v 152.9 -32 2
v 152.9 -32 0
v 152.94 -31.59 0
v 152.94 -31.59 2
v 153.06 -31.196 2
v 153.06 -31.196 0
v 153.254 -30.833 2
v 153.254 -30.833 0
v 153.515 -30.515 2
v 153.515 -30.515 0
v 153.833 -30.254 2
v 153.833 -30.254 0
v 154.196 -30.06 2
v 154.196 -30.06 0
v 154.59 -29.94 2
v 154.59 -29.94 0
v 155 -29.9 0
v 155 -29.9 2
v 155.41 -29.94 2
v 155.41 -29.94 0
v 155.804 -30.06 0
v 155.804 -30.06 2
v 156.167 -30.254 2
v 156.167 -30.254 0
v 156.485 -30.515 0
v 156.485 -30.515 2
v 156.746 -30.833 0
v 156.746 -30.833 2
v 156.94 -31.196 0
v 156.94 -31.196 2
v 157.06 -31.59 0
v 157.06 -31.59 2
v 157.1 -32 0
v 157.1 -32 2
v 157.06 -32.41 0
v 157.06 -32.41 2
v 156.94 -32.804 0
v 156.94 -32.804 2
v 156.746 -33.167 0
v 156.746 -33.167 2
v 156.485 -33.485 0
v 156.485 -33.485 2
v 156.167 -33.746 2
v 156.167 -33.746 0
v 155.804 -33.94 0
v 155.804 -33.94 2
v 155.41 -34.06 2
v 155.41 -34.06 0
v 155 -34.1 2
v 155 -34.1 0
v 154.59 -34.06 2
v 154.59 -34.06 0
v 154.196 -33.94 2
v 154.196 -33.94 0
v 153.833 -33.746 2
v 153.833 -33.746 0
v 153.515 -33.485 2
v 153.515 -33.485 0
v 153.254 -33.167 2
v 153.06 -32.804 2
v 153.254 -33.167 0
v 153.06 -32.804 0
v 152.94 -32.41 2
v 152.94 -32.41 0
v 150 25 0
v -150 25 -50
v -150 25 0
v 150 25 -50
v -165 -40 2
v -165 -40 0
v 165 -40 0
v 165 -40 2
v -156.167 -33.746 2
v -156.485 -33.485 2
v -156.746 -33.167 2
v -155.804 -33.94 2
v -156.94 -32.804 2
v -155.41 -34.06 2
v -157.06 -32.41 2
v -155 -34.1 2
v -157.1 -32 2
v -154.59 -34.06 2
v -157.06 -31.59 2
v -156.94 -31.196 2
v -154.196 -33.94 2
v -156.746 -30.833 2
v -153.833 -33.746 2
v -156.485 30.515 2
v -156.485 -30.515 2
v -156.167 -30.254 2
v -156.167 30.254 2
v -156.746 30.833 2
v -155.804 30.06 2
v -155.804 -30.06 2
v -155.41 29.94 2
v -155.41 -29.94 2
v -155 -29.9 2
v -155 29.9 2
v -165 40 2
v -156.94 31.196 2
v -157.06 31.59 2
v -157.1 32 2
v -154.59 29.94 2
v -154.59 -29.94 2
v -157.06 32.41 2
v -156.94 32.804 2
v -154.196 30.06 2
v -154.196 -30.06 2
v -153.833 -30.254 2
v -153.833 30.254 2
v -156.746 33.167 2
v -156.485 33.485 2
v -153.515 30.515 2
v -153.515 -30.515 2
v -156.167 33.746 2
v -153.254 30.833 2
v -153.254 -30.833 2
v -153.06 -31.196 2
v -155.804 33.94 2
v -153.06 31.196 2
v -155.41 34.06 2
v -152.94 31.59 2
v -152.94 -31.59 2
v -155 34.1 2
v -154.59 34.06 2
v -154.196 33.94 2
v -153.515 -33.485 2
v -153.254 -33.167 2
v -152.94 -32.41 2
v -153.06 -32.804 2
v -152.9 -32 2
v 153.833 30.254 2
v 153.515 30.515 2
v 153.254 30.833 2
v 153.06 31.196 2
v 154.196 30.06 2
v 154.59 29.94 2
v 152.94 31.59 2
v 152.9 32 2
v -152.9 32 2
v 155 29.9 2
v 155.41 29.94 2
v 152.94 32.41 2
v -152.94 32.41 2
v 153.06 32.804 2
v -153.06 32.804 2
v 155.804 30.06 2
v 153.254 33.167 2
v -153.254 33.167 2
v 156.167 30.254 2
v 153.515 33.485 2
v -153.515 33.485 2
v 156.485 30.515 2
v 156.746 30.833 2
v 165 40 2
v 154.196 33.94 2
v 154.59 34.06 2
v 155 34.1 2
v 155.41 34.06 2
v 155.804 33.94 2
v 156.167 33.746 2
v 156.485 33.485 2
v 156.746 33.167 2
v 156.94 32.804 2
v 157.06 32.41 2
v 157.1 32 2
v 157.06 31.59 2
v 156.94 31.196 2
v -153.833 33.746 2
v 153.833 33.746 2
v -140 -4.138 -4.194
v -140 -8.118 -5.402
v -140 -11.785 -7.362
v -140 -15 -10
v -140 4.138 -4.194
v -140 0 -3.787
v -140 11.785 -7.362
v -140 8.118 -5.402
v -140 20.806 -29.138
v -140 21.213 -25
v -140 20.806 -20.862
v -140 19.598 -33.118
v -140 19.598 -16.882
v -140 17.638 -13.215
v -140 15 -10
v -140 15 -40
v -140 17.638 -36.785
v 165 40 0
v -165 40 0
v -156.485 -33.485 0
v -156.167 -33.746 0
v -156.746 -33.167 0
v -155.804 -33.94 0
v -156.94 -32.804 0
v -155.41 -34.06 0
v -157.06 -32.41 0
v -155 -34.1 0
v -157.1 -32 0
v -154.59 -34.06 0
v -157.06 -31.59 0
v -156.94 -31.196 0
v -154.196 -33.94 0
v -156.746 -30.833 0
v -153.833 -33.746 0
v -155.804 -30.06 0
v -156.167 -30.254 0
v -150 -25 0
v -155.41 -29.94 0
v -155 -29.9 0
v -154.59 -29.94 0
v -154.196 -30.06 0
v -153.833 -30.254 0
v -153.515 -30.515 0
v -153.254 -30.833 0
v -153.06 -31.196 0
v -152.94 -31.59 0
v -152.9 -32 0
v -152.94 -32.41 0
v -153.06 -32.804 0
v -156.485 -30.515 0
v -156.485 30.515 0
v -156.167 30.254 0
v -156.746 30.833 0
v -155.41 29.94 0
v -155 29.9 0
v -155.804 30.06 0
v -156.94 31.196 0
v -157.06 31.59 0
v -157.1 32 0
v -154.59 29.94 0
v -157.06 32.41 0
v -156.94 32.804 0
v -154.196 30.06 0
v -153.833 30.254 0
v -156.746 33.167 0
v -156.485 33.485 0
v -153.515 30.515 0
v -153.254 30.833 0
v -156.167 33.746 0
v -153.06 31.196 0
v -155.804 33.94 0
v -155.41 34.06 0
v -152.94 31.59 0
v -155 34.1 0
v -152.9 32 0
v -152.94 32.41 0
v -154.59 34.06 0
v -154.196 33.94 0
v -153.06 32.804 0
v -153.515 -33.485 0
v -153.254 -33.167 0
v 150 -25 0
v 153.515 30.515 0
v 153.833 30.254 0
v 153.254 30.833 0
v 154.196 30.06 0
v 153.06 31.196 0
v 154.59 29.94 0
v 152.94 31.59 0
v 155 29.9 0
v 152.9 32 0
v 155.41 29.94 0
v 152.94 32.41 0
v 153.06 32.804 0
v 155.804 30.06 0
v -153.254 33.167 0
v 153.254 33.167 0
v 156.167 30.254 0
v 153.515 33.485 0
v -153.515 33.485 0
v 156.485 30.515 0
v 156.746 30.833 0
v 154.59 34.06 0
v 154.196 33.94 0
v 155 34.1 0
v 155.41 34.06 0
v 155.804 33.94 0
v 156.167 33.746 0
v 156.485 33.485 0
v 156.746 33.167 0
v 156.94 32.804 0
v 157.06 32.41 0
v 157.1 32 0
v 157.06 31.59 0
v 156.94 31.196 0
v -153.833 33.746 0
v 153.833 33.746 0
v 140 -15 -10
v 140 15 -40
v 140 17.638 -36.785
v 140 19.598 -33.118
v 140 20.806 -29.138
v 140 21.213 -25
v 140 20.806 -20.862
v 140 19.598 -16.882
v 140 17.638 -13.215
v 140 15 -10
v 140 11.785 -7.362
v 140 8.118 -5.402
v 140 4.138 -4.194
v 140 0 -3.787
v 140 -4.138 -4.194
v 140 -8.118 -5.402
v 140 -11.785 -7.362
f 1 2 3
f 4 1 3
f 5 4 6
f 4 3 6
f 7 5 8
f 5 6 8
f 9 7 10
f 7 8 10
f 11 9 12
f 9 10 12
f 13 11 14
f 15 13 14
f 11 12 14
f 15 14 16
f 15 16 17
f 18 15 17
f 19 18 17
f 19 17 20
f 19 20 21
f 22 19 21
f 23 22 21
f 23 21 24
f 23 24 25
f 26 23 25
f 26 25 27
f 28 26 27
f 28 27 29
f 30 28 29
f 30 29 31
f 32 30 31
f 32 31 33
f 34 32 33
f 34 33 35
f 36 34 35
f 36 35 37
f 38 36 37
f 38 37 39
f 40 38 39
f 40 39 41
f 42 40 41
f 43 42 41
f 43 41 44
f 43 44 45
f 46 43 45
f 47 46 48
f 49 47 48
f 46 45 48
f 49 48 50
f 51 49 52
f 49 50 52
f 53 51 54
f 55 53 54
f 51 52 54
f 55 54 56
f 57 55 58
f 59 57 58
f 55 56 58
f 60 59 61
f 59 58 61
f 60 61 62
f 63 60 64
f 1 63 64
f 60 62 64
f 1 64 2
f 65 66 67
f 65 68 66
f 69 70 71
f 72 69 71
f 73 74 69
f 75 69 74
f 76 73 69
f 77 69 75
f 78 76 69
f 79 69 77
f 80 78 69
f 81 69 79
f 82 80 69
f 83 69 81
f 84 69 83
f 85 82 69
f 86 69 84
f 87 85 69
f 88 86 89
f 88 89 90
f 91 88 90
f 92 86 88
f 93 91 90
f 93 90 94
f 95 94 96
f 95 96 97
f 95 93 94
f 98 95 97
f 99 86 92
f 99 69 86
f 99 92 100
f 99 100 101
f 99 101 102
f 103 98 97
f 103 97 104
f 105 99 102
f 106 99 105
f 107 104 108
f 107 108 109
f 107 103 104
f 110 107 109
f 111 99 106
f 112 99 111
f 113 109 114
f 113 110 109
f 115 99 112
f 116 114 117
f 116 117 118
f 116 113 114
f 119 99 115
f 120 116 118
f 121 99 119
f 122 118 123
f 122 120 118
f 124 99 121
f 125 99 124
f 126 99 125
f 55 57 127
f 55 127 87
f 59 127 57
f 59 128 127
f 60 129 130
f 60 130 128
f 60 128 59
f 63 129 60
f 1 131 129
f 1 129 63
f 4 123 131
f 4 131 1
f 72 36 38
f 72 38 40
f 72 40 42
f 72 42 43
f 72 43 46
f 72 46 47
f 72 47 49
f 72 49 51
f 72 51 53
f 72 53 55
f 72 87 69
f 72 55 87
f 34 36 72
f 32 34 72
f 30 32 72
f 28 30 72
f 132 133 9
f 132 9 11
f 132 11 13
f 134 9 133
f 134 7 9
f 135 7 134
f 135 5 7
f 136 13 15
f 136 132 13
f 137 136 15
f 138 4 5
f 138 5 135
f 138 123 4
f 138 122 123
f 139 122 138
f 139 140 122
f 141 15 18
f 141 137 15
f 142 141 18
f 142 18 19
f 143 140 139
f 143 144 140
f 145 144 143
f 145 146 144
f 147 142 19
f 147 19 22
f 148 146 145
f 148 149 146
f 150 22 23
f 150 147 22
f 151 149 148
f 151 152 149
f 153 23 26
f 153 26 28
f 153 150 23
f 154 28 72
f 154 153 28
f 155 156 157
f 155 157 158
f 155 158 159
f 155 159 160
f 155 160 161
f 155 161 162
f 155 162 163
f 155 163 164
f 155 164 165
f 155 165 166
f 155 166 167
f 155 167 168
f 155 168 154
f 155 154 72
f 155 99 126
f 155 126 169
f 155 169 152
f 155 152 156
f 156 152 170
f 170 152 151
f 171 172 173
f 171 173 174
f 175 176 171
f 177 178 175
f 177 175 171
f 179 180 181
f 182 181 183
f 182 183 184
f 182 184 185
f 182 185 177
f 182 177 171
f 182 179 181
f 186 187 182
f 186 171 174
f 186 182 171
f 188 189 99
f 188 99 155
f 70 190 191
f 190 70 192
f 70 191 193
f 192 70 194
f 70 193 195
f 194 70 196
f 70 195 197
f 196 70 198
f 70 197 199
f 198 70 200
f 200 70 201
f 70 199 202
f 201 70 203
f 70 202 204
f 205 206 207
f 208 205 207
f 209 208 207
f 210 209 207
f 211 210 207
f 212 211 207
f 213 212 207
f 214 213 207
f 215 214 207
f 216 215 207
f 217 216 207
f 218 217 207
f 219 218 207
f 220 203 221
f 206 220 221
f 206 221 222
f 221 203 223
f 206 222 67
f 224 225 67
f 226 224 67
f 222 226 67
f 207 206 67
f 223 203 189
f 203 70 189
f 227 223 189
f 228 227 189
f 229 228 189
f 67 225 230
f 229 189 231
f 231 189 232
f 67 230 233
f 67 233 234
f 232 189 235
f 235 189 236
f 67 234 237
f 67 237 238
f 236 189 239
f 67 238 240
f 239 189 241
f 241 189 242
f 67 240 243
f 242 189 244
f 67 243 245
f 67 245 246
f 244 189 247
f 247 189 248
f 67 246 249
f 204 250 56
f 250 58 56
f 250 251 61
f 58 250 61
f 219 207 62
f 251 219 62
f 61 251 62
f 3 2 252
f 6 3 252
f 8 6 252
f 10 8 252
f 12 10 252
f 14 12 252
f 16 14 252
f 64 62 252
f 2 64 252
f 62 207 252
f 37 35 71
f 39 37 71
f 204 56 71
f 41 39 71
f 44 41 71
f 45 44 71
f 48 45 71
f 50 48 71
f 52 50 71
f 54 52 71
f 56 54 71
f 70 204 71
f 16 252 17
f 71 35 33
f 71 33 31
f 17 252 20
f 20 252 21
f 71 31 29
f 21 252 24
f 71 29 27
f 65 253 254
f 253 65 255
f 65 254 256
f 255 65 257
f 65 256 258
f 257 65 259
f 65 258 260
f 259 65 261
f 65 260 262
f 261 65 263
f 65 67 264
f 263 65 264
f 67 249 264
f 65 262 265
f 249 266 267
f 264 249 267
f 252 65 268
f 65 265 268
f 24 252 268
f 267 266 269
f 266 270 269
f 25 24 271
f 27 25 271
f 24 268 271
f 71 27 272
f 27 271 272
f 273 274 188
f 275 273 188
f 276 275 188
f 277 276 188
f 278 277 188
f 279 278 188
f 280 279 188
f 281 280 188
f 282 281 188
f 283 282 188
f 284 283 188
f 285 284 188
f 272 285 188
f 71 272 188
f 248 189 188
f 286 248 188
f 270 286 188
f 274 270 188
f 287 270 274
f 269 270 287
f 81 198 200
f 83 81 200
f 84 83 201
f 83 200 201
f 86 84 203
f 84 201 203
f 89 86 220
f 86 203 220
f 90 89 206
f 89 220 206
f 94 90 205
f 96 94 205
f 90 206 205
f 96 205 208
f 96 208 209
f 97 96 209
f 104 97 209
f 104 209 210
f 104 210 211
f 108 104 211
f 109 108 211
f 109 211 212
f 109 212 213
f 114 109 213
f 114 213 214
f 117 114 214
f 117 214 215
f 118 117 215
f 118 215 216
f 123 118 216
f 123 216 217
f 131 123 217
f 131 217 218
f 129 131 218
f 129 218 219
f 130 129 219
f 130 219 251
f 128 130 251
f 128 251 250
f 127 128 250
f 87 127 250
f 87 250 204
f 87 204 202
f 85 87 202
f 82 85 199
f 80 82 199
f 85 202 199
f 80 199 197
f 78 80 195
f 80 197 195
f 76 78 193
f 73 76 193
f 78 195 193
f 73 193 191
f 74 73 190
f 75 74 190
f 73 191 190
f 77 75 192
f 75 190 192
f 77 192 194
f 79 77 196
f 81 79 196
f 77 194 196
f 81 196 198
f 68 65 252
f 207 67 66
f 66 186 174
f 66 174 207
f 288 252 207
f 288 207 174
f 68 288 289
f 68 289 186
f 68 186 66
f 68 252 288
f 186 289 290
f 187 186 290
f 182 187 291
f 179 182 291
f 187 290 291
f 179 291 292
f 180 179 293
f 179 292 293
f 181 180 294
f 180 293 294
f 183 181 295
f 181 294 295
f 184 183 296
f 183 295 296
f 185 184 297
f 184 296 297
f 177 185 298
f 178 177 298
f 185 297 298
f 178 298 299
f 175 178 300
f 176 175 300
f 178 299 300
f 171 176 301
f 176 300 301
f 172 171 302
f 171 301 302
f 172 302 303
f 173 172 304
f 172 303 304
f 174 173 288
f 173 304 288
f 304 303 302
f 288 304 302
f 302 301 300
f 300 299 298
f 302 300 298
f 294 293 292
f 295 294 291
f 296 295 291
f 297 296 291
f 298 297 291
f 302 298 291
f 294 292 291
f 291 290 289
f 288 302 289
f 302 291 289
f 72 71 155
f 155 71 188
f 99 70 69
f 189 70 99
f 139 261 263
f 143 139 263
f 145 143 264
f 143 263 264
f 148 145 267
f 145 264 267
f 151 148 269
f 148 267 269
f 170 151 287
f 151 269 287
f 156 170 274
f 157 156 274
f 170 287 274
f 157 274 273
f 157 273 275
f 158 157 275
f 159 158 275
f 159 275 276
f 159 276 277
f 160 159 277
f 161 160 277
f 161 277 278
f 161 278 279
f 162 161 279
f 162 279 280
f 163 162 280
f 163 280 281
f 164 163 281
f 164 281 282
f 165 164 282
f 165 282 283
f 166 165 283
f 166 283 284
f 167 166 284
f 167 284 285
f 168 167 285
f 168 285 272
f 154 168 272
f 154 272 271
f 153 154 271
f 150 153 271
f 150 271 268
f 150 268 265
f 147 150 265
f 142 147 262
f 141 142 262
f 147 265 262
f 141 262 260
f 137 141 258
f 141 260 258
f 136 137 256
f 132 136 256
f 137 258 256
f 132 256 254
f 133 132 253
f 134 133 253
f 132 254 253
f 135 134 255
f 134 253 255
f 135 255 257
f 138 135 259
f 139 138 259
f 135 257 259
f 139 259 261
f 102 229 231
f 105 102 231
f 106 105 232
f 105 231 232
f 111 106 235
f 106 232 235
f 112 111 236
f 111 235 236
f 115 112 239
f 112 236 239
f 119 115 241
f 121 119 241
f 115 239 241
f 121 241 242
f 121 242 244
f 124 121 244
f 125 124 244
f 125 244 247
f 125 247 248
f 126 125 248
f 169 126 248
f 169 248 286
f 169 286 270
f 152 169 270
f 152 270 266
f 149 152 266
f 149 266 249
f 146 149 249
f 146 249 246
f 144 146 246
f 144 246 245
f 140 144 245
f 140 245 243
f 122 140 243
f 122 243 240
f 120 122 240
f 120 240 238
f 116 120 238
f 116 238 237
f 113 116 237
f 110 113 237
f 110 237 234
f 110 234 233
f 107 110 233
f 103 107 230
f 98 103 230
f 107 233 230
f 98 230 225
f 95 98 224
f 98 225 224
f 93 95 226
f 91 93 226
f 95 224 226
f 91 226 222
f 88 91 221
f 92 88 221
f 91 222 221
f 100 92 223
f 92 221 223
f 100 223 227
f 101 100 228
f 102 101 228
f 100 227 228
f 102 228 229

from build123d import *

# Parameters (mm, degrees)
SKETCH_1_W          = 330
SKETCH_1_H          = 80
EXTRUDE_1_DEPTH     = 2
HOLE_WIZARD_M5_1_D  = 4.2
EXTRUDE_2_DEPTH     = 150
SKETCH_6_R          = 21.213203436
CUT_EXTRUDE_1_DEPTH = 280


with BuildPart() as part:
    # 草图1 → 凸台-拉伸1 (new body)
    with BuildSketch(Plane.XY):
        Rectangle(SKETCH_1_W, SKETCH_1_H)
    extrude(amount=EXTRUDE_1_DEPTH)

    # M5 螺纹孔1 (through all)
    with Locations(Plane.XY.offset(2)):
        with Locations((-155, 32), (-155, -32), (155, 32), (155, -32)):
            Hole(HOLE_WIZARD_M5_1_D / 2)

    # 草图5 → 凸台-拉伸2 (add, symmetric)
    with BuildSketch(Plane(origin=(0, 0, 0), x_dir=(0, 0, -1), z_dir=(1, 0, 0))):
        Polygon((0, 25), (0, -25), (50, 25), align=None)
    extrude(amount=EXTRUDE_2_DEPTH, both=True)

    # 草图6 → 切除-拉伸1 (cut)
    with BuildSketch(Plane(origin=(140, 0, 0), x_dir=(0, 0, -1), z_dir=(1, 0, 0))):
        with Locations((25, 0)):
            Circle(SKETCH_6_R)
    extrude(amount=-CUT_EXTRUDE_1_DEPTH, mode=Mode.SUBTRACT)


solid = part.part
